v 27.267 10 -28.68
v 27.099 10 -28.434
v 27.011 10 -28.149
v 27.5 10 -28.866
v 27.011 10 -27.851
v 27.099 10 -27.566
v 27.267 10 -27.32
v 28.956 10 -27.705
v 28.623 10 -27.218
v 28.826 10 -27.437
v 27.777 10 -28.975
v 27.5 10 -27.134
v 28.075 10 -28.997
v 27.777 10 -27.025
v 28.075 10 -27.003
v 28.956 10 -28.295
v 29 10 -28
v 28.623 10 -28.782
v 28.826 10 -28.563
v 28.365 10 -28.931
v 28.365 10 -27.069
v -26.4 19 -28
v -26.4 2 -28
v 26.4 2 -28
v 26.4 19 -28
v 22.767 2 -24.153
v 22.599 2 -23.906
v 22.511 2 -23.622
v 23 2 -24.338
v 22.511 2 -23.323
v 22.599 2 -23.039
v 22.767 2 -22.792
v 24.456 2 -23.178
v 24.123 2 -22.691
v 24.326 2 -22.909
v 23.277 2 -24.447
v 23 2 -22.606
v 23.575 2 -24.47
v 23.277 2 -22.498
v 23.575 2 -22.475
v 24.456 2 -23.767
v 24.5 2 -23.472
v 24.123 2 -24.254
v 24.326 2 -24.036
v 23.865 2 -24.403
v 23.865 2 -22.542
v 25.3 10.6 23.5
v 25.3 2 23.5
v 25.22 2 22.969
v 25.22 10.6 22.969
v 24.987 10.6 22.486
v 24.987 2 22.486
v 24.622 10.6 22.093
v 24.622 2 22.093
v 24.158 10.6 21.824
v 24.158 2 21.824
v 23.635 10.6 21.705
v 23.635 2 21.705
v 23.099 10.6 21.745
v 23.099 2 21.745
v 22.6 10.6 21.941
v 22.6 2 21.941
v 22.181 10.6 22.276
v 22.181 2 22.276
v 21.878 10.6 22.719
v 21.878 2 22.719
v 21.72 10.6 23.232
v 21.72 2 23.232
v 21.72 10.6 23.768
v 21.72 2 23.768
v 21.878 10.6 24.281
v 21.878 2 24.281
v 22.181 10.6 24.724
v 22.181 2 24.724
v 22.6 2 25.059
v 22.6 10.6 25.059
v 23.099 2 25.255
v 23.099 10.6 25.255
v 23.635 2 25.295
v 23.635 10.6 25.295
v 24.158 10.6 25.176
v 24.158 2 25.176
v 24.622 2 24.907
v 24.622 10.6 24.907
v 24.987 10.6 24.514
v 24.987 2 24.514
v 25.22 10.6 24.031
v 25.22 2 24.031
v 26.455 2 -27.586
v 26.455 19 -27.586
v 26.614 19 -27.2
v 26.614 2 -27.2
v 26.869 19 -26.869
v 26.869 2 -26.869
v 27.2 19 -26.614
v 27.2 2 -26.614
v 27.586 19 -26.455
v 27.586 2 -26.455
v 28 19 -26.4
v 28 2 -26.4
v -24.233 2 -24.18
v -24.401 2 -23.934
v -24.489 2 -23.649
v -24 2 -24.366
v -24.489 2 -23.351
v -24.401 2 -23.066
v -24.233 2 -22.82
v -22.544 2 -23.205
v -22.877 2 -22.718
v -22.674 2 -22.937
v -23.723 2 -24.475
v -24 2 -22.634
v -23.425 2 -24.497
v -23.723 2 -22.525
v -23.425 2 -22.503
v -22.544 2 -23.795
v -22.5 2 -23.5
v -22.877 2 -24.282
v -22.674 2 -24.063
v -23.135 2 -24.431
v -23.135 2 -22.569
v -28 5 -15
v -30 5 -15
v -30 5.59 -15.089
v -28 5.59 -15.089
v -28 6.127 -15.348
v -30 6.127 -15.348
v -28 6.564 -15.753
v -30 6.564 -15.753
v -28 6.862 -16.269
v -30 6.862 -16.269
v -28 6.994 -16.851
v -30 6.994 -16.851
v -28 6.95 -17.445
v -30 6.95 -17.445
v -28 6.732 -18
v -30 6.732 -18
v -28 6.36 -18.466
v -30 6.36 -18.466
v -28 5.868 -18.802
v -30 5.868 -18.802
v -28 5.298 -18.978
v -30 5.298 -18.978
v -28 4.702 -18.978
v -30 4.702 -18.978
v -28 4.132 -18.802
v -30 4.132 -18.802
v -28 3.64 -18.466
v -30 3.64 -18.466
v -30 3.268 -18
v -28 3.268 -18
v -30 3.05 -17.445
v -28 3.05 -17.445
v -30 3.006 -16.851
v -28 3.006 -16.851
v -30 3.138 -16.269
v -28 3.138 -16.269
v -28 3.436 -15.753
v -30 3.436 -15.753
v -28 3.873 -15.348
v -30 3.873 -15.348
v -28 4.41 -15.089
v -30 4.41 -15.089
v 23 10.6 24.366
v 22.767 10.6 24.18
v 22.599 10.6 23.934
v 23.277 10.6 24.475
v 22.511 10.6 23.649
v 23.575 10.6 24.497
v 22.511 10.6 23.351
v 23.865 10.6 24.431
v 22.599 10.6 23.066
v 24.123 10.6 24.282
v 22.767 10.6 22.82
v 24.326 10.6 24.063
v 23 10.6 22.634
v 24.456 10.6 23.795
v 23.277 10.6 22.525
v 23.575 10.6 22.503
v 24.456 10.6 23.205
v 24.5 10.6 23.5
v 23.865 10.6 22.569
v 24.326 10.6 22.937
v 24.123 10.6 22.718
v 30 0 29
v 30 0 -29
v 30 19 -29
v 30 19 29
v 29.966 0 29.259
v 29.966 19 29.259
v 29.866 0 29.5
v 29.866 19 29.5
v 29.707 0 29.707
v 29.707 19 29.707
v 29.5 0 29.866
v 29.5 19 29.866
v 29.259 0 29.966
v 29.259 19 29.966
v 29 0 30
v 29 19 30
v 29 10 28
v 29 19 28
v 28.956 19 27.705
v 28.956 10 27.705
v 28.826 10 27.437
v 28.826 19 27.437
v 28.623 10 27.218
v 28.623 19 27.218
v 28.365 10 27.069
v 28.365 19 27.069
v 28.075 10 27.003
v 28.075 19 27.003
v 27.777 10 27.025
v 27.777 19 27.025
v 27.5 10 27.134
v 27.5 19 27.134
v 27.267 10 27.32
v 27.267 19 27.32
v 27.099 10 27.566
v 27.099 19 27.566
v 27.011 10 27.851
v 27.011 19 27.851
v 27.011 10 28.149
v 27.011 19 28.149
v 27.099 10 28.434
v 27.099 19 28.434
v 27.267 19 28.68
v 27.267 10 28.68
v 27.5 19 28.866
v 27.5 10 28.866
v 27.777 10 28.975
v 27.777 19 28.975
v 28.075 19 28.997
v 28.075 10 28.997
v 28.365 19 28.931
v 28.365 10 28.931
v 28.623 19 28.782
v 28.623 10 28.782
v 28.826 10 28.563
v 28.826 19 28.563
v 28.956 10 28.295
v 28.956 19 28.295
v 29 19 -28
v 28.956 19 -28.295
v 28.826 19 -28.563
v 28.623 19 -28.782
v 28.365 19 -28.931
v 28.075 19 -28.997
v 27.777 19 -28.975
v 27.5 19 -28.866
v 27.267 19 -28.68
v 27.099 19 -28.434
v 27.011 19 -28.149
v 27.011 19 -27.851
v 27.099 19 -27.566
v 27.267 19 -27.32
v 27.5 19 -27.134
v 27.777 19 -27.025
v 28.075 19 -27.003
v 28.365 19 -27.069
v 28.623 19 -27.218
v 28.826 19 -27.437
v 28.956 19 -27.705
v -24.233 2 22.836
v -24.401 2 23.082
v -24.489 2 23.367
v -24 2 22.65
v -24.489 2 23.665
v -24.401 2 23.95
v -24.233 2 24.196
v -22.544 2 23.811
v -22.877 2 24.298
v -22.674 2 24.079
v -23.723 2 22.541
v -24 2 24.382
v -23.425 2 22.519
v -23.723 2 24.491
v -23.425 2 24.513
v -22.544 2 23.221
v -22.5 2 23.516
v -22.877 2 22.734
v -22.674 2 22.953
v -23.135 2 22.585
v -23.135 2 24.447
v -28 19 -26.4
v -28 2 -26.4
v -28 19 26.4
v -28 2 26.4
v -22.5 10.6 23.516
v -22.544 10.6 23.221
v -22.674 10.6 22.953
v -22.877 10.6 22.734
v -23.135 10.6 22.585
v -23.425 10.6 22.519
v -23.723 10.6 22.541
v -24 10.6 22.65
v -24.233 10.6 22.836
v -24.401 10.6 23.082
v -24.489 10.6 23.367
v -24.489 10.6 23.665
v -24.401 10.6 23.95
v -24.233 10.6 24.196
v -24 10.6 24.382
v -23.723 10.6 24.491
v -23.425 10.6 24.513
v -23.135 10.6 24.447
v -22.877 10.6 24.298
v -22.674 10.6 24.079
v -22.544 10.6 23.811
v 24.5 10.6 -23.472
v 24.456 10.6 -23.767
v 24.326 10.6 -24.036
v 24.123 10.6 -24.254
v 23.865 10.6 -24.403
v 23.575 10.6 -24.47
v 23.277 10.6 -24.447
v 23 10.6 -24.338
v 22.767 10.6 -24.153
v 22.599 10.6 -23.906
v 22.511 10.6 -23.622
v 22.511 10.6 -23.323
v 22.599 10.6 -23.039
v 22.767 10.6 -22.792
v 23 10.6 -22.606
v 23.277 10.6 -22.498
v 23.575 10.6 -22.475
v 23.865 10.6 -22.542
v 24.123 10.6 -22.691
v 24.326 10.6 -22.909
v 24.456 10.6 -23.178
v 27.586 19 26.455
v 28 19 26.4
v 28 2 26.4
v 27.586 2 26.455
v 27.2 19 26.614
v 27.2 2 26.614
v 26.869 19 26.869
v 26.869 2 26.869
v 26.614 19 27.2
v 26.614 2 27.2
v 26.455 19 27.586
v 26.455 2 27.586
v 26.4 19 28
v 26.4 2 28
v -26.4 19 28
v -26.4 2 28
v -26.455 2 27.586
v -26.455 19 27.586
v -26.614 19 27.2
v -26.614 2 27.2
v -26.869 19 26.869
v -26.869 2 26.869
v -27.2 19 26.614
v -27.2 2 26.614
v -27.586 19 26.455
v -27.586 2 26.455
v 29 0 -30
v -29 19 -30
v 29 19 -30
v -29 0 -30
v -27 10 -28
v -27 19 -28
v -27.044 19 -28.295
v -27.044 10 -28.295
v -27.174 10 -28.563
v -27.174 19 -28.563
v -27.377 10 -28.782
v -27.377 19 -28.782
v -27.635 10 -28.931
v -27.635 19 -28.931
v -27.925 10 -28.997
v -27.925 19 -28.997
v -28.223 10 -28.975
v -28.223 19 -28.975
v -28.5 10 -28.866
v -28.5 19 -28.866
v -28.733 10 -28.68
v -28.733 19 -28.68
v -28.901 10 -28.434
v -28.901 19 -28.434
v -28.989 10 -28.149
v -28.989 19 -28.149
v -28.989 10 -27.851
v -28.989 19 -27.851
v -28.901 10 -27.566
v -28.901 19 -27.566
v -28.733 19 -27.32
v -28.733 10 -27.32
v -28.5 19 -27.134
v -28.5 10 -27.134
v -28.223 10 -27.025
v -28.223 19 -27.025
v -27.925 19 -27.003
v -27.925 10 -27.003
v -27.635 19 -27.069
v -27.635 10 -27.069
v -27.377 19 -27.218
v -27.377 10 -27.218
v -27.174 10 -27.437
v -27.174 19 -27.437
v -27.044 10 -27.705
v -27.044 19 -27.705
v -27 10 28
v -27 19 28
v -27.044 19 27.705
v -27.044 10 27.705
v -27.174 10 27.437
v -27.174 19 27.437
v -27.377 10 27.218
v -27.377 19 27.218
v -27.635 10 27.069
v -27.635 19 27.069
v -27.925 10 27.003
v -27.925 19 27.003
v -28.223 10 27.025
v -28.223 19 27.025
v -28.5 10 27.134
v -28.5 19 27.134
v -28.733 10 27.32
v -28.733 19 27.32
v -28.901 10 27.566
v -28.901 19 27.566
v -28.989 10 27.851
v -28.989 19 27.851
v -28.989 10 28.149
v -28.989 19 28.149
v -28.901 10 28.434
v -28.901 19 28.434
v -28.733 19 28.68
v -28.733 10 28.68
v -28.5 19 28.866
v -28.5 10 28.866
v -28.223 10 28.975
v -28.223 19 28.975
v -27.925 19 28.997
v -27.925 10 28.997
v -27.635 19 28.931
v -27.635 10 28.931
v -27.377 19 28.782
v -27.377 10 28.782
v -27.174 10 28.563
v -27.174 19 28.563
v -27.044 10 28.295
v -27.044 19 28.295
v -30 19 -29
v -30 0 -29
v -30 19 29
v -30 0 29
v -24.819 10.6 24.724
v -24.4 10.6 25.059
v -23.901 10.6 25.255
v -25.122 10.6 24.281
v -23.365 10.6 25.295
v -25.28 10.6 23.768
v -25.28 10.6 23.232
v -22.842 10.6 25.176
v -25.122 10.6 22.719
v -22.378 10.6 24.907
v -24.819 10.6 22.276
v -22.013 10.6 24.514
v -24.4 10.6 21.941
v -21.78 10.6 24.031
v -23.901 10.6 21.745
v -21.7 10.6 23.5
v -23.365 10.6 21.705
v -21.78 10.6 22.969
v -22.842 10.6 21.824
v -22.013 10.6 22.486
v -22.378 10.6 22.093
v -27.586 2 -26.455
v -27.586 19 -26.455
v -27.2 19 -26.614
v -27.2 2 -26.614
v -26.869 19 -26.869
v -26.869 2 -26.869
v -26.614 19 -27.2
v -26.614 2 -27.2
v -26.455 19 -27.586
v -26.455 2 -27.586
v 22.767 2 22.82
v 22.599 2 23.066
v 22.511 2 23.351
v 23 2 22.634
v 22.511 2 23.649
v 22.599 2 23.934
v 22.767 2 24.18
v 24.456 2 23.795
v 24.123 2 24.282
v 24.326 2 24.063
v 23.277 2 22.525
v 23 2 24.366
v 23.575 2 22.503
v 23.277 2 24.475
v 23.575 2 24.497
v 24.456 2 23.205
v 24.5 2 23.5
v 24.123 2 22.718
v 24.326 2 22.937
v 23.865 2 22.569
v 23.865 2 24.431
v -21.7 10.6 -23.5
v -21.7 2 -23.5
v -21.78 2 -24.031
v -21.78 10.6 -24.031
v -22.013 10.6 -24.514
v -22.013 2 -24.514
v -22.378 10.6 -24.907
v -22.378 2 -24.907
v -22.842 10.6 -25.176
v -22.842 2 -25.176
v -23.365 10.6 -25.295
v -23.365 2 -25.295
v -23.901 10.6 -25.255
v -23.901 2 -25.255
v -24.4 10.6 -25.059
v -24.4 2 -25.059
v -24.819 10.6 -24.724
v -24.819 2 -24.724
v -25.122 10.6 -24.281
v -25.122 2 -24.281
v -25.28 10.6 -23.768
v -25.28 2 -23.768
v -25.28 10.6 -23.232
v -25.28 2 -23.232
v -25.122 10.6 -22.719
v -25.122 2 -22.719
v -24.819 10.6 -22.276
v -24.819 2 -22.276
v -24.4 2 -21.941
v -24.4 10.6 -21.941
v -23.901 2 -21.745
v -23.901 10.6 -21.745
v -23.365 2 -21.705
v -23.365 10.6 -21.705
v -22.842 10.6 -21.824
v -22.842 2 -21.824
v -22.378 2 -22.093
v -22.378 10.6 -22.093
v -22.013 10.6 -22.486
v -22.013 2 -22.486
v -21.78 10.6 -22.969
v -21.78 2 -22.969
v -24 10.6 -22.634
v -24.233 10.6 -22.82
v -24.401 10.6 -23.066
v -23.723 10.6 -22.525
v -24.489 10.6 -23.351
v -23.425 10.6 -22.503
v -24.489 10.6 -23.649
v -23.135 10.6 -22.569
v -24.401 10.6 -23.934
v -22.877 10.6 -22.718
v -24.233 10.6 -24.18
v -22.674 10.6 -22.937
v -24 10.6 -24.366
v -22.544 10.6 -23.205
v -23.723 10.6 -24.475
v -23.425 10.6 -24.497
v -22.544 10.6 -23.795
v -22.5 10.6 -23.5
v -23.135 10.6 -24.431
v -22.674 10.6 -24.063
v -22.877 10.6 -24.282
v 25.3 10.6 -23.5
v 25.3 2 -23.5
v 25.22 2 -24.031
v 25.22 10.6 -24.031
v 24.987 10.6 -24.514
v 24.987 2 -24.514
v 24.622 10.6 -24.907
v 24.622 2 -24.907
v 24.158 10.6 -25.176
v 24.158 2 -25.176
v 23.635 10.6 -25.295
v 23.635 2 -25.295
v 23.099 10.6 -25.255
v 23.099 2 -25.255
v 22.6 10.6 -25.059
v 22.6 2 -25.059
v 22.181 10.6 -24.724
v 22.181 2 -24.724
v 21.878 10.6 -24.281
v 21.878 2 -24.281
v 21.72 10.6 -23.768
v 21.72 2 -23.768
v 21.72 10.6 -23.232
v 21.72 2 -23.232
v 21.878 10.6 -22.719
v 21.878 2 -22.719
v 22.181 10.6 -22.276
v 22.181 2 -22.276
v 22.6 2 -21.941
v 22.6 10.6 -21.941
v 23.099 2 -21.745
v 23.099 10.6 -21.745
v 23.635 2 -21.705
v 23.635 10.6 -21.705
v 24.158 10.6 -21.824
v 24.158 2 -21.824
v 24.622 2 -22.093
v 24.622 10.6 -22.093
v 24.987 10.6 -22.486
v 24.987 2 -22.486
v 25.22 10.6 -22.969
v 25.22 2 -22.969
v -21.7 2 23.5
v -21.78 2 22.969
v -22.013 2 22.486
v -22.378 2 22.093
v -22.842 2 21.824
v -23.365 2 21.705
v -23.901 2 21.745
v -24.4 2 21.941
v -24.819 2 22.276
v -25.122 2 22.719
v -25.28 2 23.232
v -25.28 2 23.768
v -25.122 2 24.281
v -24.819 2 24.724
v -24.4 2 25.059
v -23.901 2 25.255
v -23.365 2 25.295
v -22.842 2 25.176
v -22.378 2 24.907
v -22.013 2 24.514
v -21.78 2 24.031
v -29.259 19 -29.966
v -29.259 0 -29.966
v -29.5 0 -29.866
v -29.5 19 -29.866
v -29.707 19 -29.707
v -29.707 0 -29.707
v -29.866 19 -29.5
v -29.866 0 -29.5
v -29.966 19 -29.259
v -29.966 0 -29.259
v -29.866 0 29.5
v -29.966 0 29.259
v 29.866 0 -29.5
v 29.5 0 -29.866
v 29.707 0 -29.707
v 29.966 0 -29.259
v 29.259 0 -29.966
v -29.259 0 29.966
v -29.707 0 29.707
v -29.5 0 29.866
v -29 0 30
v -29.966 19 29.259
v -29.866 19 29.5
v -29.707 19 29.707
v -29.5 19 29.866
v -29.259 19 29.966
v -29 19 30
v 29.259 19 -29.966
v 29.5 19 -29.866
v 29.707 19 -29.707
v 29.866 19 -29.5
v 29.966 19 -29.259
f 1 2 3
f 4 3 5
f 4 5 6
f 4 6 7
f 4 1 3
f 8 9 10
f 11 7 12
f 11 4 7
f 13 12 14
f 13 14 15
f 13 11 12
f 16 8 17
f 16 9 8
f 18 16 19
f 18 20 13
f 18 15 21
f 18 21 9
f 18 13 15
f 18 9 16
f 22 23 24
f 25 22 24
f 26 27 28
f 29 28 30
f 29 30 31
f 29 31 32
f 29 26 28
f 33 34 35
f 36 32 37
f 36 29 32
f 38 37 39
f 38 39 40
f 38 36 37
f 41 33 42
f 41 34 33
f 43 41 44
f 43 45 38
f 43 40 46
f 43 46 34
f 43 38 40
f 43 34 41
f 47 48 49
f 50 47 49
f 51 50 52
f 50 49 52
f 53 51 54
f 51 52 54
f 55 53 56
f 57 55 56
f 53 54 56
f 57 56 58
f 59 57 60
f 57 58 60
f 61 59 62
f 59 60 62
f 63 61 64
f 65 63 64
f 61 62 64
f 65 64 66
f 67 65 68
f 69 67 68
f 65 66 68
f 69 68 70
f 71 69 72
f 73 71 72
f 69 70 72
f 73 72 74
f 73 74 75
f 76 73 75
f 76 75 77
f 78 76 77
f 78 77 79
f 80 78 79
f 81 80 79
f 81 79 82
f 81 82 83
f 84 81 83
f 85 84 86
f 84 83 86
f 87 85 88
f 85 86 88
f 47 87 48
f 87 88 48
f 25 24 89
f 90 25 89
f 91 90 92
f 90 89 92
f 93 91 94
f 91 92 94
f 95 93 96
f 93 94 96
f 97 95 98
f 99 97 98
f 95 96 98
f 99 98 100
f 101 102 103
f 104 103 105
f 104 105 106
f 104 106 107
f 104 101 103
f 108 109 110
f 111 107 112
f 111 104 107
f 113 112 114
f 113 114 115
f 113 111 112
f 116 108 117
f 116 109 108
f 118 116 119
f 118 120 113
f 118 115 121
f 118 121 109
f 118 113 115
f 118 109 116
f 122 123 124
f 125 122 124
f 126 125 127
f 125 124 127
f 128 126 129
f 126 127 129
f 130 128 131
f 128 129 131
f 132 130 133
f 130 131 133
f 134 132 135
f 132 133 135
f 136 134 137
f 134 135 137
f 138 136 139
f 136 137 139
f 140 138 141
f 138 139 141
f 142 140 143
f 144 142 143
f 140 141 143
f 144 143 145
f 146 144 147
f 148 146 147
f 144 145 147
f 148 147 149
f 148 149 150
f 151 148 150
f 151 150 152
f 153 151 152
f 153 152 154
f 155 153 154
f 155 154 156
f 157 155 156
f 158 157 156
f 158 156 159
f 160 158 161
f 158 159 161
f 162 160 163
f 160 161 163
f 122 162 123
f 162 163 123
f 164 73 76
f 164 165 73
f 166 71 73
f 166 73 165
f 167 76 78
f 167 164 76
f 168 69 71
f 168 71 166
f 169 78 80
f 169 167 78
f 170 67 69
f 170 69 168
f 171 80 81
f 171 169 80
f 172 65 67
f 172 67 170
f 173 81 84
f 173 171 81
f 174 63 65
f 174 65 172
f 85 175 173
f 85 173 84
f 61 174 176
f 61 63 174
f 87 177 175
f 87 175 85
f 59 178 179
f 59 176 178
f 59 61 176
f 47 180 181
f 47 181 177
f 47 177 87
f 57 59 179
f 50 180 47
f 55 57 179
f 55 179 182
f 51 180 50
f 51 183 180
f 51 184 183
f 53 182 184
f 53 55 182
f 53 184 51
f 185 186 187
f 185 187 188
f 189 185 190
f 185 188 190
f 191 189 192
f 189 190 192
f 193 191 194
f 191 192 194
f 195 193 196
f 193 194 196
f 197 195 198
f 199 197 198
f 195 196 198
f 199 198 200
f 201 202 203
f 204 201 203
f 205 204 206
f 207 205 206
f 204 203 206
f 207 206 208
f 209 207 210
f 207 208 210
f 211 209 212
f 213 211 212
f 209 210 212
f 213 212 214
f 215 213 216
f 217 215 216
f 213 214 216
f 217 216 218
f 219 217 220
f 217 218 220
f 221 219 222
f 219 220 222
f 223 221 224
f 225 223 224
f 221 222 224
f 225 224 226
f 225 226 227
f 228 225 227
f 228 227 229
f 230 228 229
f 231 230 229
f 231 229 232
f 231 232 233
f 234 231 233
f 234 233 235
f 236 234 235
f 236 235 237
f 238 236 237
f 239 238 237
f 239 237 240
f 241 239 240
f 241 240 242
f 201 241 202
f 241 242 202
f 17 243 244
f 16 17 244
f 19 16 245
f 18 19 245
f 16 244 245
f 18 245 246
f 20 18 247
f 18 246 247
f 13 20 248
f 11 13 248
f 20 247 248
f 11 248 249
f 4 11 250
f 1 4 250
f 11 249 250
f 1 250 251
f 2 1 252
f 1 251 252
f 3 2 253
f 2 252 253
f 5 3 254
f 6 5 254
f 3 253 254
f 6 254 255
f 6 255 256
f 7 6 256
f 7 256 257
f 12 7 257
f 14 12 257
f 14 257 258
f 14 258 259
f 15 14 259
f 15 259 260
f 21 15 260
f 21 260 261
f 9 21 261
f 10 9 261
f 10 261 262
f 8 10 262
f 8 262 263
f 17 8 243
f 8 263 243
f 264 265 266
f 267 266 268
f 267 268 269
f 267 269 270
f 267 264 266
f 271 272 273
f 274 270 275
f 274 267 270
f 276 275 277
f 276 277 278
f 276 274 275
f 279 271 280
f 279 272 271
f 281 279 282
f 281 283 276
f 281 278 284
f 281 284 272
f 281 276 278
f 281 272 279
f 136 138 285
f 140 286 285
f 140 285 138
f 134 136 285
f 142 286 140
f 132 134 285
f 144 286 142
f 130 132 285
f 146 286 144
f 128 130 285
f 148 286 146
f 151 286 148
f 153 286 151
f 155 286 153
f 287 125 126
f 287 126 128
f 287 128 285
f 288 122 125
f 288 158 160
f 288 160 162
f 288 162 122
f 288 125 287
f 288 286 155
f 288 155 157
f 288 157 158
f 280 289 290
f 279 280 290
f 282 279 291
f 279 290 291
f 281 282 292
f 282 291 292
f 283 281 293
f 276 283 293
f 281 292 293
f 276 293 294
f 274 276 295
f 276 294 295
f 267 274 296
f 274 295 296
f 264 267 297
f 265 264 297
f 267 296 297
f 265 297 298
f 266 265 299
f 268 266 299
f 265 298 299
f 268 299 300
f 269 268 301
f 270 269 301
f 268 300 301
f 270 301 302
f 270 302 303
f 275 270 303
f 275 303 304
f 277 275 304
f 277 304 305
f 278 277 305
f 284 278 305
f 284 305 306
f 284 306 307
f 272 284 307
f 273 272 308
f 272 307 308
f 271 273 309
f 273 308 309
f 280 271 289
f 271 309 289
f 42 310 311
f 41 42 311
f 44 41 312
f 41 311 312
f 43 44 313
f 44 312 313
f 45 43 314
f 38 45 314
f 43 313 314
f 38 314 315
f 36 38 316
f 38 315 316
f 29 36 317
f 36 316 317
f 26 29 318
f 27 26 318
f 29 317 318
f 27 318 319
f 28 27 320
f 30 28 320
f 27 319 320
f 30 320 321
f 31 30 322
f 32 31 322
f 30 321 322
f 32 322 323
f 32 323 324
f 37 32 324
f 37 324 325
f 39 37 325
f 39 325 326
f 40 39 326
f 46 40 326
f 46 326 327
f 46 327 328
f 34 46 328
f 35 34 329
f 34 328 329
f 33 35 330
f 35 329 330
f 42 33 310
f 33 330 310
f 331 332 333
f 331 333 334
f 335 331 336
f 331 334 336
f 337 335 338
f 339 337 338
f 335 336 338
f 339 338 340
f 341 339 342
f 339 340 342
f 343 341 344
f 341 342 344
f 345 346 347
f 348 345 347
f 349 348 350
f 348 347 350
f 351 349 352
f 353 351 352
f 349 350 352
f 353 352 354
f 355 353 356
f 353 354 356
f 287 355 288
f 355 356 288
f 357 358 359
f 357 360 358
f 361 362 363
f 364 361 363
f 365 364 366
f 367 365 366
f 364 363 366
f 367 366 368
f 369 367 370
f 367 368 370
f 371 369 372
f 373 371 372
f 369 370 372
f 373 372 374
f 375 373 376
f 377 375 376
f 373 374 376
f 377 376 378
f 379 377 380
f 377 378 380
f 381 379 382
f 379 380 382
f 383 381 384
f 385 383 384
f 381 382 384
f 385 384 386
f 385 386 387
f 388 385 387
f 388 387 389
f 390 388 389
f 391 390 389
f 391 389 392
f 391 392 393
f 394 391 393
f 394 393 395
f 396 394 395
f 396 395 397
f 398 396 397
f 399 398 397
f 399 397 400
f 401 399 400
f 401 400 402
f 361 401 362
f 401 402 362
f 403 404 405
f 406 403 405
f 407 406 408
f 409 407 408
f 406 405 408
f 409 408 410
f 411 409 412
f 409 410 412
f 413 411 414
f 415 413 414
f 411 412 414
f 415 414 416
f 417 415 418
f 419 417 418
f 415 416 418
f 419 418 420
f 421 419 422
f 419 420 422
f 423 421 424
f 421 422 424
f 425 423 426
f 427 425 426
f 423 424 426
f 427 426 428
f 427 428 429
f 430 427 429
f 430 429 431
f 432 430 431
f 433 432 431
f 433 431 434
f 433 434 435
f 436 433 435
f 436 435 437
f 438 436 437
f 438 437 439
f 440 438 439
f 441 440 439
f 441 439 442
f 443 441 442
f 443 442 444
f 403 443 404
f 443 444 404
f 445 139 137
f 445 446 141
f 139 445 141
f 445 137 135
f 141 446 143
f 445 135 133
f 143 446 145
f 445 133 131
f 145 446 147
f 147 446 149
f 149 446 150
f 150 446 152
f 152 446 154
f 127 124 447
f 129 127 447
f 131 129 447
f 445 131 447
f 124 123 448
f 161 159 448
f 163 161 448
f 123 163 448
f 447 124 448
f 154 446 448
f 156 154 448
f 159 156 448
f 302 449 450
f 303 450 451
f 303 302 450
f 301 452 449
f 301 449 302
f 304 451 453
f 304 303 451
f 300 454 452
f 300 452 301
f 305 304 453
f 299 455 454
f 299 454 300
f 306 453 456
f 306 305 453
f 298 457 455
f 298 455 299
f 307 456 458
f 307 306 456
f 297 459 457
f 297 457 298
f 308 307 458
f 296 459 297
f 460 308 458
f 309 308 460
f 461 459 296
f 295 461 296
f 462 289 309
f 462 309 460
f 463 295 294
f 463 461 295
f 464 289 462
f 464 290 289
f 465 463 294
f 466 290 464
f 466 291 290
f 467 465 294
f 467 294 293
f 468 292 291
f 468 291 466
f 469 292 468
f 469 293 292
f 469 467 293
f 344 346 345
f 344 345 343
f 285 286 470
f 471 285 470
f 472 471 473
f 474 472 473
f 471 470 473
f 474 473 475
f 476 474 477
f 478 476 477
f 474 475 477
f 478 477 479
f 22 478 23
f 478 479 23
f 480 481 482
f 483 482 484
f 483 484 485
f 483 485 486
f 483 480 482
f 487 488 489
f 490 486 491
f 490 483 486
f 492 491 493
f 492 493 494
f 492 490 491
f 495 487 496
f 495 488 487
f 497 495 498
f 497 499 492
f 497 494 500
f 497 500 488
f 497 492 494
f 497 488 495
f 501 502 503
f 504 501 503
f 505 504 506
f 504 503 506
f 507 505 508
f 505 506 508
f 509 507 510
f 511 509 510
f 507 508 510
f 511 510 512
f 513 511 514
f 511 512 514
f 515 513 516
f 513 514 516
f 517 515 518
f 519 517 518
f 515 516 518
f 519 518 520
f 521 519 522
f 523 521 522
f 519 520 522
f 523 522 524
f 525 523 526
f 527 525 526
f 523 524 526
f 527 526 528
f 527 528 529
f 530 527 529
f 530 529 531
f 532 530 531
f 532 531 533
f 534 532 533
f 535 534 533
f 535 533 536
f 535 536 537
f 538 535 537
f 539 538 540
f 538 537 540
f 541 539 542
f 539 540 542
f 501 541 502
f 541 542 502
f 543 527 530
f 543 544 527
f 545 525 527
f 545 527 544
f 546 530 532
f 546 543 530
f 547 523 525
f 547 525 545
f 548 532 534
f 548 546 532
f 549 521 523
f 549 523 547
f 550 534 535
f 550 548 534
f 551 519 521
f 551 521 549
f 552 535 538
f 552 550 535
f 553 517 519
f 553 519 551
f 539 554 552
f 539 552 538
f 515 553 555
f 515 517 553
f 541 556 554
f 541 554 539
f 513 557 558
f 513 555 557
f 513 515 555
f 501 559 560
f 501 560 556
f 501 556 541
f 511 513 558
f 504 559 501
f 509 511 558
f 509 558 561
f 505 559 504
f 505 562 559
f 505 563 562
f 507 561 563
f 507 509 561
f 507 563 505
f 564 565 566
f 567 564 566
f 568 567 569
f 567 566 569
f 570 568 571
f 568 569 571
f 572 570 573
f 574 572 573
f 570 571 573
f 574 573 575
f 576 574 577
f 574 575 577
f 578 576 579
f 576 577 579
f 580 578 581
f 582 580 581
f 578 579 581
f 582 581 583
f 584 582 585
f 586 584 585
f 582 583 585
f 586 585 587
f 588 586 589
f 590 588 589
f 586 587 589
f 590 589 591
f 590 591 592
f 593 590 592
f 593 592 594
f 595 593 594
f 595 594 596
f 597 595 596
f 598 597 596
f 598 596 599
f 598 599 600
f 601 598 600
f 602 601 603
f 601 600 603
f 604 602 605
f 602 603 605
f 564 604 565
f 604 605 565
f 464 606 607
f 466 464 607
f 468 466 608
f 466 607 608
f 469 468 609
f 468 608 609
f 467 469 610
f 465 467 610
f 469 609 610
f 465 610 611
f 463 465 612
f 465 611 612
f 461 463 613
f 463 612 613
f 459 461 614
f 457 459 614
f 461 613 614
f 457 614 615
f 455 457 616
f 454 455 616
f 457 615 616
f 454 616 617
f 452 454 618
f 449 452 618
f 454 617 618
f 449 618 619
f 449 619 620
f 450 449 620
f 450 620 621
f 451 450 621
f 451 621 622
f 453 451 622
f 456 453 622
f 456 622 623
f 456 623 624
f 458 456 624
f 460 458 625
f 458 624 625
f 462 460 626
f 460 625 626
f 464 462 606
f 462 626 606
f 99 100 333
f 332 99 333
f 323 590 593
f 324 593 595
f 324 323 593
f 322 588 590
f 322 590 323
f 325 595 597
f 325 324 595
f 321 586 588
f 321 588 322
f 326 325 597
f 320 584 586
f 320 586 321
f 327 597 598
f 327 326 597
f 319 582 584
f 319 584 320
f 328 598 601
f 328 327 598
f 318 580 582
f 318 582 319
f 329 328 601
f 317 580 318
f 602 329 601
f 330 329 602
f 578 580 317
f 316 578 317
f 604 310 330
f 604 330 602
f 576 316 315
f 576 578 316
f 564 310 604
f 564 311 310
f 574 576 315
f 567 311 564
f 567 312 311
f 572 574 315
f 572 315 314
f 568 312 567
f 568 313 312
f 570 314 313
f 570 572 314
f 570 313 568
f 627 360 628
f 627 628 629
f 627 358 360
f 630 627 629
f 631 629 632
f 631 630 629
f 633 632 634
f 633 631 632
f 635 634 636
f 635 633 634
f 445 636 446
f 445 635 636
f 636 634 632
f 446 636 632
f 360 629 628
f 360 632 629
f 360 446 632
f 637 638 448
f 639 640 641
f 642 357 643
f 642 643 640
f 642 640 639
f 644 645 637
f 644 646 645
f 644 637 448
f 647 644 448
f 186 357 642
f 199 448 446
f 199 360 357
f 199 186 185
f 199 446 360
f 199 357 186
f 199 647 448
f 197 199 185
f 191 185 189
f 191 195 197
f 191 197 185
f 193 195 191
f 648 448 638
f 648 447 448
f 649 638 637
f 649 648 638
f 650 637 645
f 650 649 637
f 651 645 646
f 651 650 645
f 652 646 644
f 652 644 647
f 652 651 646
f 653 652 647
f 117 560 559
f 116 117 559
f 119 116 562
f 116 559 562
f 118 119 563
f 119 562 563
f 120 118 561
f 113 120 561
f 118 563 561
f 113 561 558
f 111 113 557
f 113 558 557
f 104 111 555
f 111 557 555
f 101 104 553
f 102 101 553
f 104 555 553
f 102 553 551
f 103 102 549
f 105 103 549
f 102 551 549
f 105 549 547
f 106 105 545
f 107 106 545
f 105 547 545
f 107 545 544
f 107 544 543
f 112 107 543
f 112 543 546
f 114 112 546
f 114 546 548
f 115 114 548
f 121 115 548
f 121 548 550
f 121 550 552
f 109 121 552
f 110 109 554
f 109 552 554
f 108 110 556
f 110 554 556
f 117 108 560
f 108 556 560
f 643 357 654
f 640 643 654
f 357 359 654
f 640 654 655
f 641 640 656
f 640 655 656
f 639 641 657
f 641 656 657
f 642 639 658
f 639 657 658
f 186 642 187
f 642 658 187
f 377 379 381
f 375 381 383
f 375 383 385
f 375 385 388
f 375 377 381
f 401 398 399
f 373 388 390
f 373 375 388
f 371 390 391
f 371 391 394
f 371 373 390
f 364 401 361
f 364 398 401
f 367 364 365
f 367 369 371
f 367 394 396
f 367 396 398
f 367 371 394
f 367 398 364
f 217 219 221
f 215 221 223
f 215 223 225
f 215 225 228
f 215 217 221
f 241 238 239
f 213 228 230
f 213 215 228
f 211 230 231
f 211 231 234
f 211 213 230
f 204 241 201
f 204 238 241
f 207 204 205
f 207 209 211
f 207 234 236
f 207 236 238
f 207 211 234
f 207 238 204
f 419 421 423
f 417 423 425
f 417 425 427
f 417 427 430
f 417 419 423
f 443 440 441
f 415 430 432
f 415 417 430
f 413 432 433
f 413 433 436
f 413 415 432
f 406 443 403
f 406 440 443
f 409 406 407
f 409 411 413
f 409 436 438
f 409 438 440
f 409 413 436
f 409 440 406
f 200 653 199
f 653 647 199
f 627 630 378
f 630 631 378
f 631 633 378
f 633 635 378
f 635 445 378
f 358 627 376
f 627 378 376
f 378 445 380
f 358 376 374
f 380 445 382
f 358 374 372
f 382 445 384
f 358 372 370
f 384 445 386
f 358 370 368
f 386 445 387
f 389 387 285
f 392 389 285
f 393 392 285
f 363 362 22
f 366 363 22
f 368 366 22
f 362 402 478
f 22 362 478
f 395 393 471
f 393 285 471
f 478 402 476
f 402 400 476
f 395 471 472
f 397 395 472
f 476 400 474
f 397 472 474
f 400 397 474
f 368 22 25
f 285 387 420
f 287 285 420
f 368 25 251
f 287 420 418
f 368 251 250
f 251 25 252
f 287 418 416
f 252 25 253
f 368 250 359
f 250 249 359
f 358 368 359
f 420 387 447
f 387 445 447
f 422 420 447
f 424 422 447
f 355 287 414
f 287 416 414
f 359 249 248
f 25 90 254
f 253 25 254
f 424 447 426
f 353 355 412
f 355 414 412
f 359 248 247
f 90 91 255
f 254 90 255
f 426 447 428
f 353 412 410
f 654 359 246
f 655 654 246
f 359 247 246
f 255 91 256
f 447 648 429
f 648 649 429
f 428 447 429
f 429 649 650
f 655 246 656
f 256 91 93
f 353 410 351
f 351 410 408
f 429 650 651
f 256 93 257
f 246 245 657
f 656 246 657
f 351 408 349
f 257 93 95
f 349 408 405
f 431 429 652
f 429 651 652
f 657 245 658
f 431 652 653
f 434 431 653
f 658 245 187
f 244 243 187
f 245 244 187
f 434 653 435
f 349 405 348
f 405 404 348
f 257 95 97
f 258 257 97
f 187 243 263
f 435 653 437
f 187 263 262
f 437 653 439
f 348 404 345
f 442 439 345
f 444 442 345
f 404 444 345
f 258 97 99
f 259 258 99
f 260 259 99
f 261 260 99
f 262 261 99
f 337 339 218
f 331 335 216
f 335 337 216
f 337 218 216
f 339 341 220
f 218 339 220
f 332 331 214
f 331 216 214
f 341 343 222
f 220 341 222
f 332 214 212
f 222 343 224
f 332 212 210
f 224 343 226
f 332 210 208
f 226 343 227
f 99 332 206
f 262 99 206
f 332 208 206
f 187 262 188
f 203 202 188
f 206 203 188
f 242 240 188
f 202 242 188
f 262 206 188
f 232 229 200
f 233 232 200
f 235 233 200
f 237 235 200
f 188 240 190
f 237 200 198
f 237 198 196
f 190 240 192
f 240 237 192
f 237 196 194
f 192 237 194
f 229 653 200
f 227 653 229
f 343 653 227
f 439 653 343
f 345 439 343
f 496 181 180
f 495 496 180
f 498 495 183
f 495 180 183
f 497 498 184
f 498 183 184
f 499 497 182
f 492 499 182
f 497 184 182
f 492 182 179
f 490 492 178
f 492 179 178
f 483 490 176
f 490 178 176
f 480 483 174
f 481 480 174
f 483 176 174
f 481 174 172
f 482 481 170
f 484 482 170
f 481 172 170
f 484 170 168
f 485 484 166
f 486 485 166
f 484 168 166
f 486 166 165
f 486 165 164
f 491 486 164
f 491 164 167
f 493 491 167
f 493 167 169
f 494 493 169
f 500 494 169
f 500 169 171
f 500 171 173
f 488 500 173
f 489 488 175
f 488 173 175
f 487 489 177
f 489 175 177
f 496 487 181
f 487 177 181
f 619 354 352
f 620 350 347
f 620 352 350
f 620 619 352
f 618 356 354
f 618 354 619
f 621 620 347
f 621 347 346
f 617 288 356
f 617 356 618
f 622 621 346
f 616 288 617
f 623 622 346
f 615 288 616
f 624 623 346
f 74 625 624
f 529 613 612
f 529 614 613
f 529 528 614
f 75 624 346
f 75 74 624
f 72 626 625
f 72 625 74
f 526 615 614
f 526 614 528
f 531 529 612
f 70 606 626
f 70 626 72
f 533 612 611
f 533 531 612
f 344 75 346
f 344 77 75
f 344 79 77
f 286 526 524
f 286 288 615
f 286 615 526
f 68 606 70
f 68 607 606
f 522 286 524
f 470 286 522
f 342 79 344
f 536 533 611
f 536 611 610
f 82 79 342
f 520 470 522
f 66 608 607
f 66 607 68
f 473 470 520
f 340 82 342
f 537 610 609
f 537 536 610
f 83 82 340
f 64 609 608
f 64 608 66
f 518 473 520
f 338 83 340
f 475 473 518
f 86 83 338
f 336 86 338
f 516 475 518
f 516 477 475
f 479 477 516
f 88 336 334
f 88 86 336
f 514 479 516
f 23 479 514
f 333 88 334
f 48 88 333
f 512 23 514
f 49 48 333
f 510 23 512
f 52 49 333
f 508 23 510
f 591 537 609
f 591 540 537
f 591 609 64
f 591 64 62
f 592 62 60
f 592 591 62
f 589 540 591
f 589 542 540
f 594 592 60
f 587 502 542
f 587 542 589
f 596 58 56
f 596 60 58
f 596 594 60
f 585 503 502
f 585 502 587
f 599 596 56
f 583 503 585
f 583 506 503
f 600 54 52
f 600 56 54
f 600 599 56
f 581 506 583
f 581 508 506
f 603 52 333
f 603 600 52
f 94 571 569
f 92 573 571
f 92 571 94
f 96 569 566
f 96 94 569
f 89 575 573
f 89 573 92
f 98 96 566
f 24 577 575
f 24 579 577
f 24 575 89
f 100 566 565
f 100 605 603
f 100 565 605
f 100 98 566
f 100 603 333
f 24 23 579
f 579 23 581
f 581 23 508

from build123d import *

# Parameters (mm, degrees)
SKETCH_1_W          = 56
SKETCH_1_H          = 56
EXTRUDE_1_DEPTH     = 2
SKETCH_2_R          = 1.8
EXTRUDE_2_DEPTH     = 8.6
SKETCH_3_R          = 1
CUT_EXTRUDE_1_DEPTH = 8.6
SKETCH_5_W          = 58
SKETCH_5_H          = 2
EXTRUDE_3_DEPTH     = 19
SKETCH_6_W          = 2
SKETCH_6_H          = 58
EXTRUDE_4_DEPTH     = 19
SKETCH_7_W          = 58
SKETCH_7_H          = 2
EXTRUDE_5_DEPTH     = 19
SKETCH_8_W          = 2
SKETCH_8_H          = 58
EXTRUDE_6_DEPTH     = 19
SKETCH_9_R          = 2
CUT_EXTRUDE_2_DEPTH = 2
SKETCH_10_R         = 1.6
EXTRUDE_7_DEPTH     = 17
SKETCH_11_R         = 1
CUT_EXTRUDE_3_DEPTH = 9
FILLET_1_R          = 1


with BuildPart() as part:
    # Эскиз1 → Бобышка-Вытянуть1 (new body)
    with BuildSketch(Plane(origin=(0, 0, 0), x_dir=(1, 0, 0), z_dir=(0, 1, 0))):
        Rectangle(SKETCH_1_W, SKETCH_1_H)
    extrude(amount=EXTRUDE_1_DEPTH)

    # Эскиз2 → Бобышка-Вытянуть2 (add)
    with BuildSketch(Plane(origin=(0, 2, 0), x_dir=(1, 0, 0), z_dir=(0, 1, 0))):
        with Locations((-23.5, -23.5)):
            Circle(SKETCH_2_R)
        with Locations((-23.5, 23.5)):
            Circle(SKETCH_2_R)
        with Locations((23.5, 23.5)):
            Circle(SKETCH_2_R)
        with Locations((23.5, -23.5)):
            Circle(SKETCH_2_R)
    extrude(amount=EXTRUDE_2_DEPTH)

    # Эскиз3 → Вырез-Вытянуть1 (cut)
    with BuildSketch(Plane(origin=(0, 10.6, 0), x_dir=(1, 0, 0), z_dir=(0, 1, 0))):
        with Locations((-23.5, 23.5)):
            Circle(SKETCH_3_R)
        with Locations((23.5, 23.4724717)):
            Circle(SKETCH_3_R)
        with Locations((23.5, -23.5)):
            Circle(SKETCH_3_R)
        with Locations((-23.5, -23.516051304)):
            Circle(SKETCH_3_R)
    extrude(amount=-CUT_EXTRUDE_1_DEPTH, mode=Mode.SUBTRACT)



with BuildPart() as body_2:
    # Эскиз5 → Бобышка-Вытянуть3 (new body)
    with BuildSketch(Plane.XZ):
        with Locations((1, -29)):
            Rectangle(SKETCH_5_W, SKETCH_5_H)
    extrude(amount=-EXTRUDE_3_DEPTH)


with BuildPart() as part_1:
    add(part.part)

    add(body_2.part)  # Бобышка-Вытянуть4 merges body 2
    # Эскиз6 → Бобышка-Вытянуть4 (add)
    with BuildSketch(Plane.XZ):
        with Locations((29, 1)):
            Rectangle(SKETCH_6_W, SKETCH_6_H)
    extrude(amount=-EXTRUDE_4_DEPTH)



with BuildPart() as body_2_2:
    # Эскиз7 → Бобышка-Вытянуть5 (new body)
    with BuildSketch(Plane.XZ):
        with Locations((-1, 29)):
            Rectangle(SKETCH_7_W, SKETCH_7_H)
    extrude(amount=-EXTRUDE_5_DEPTH)


with BuildPart() as part_2:
    add(part_1.part)

    add(body_2_2.part)  # Бобышка-Вытянуть6 merges body 2 2
    # Эскиз8 → Бобышка-Вытянуть6 (add)
    with BuildSketch(Plane.XZ):
        with Locations((-29, -1)):
            Rectangle(SKETCH_8_W, SKETCH_8_H)
    extrude(amount=-EXTRUDE_6_DEPTH)

    # Эскиз9 → Вырез-Вытянуть2 (cut)
    with BuildSketch(Plane.ZY.offset(30)):
        with Locations((-17, 5)):
            Circle(SKETCH_9_R)
    extrude(amount=-CUT_EXTRUDE_2_DEPTH, mode=Mode.SUBTRACT)

    # Эскиз10 → Бобышка-Вытянуть7 (add)
    with BuildSketch(Plane(origin=(0, 2, 0), x_dir=(1, 0, 0), z_dir=(0, 1, 0))):
        with Locations((-28, 28)):
            Circle(SKETCH_10_R)
        with Locations((28, 28)):
            Circle(SKETCH_10_R)
        with Locations((28, -28)):
            Circle(SKETCH_10_R)
        with Locations((-28, -28)):
            Circle(SKETCH_10_R)
    extrude(amount=EXTRUDE_7_DEPTH)

    # Эскиз11 → Вырез-Вытянуть3 (cut)
    with BuildSketch(Plane(origin=(0, 19, 0), x_dir=(1, 0, 0), z_dir=(0, 1, 0))):
        with Locations((-28, 28)):
            Circle(SKETCH_11_R)
        with Locations((28, 28)):
            Circle(SKETCH_11_R)
        with Locations((-28, -28)):
            Circle(SKETCH_11_R)
        with Locations((28, -28)):
            Circle(SKETCH_11_R)
    extrude(amount=-CUT_EXTRUDE_3_DEPTH, mode=Mode.SUBTRACT)

    # Скругление1
    fillet_1_edges = [part_2.edges().sort_by_distance(p)[0] for p in [
        (-30, 9.5, 30),
        (30, 9.5, 30),
        (30, 9.5, -30),
        (-30, 9.5, -30),
    ]]
    fillet(fillet_1_edges, radius=FILLET_1_R)


solid = part_2.part
